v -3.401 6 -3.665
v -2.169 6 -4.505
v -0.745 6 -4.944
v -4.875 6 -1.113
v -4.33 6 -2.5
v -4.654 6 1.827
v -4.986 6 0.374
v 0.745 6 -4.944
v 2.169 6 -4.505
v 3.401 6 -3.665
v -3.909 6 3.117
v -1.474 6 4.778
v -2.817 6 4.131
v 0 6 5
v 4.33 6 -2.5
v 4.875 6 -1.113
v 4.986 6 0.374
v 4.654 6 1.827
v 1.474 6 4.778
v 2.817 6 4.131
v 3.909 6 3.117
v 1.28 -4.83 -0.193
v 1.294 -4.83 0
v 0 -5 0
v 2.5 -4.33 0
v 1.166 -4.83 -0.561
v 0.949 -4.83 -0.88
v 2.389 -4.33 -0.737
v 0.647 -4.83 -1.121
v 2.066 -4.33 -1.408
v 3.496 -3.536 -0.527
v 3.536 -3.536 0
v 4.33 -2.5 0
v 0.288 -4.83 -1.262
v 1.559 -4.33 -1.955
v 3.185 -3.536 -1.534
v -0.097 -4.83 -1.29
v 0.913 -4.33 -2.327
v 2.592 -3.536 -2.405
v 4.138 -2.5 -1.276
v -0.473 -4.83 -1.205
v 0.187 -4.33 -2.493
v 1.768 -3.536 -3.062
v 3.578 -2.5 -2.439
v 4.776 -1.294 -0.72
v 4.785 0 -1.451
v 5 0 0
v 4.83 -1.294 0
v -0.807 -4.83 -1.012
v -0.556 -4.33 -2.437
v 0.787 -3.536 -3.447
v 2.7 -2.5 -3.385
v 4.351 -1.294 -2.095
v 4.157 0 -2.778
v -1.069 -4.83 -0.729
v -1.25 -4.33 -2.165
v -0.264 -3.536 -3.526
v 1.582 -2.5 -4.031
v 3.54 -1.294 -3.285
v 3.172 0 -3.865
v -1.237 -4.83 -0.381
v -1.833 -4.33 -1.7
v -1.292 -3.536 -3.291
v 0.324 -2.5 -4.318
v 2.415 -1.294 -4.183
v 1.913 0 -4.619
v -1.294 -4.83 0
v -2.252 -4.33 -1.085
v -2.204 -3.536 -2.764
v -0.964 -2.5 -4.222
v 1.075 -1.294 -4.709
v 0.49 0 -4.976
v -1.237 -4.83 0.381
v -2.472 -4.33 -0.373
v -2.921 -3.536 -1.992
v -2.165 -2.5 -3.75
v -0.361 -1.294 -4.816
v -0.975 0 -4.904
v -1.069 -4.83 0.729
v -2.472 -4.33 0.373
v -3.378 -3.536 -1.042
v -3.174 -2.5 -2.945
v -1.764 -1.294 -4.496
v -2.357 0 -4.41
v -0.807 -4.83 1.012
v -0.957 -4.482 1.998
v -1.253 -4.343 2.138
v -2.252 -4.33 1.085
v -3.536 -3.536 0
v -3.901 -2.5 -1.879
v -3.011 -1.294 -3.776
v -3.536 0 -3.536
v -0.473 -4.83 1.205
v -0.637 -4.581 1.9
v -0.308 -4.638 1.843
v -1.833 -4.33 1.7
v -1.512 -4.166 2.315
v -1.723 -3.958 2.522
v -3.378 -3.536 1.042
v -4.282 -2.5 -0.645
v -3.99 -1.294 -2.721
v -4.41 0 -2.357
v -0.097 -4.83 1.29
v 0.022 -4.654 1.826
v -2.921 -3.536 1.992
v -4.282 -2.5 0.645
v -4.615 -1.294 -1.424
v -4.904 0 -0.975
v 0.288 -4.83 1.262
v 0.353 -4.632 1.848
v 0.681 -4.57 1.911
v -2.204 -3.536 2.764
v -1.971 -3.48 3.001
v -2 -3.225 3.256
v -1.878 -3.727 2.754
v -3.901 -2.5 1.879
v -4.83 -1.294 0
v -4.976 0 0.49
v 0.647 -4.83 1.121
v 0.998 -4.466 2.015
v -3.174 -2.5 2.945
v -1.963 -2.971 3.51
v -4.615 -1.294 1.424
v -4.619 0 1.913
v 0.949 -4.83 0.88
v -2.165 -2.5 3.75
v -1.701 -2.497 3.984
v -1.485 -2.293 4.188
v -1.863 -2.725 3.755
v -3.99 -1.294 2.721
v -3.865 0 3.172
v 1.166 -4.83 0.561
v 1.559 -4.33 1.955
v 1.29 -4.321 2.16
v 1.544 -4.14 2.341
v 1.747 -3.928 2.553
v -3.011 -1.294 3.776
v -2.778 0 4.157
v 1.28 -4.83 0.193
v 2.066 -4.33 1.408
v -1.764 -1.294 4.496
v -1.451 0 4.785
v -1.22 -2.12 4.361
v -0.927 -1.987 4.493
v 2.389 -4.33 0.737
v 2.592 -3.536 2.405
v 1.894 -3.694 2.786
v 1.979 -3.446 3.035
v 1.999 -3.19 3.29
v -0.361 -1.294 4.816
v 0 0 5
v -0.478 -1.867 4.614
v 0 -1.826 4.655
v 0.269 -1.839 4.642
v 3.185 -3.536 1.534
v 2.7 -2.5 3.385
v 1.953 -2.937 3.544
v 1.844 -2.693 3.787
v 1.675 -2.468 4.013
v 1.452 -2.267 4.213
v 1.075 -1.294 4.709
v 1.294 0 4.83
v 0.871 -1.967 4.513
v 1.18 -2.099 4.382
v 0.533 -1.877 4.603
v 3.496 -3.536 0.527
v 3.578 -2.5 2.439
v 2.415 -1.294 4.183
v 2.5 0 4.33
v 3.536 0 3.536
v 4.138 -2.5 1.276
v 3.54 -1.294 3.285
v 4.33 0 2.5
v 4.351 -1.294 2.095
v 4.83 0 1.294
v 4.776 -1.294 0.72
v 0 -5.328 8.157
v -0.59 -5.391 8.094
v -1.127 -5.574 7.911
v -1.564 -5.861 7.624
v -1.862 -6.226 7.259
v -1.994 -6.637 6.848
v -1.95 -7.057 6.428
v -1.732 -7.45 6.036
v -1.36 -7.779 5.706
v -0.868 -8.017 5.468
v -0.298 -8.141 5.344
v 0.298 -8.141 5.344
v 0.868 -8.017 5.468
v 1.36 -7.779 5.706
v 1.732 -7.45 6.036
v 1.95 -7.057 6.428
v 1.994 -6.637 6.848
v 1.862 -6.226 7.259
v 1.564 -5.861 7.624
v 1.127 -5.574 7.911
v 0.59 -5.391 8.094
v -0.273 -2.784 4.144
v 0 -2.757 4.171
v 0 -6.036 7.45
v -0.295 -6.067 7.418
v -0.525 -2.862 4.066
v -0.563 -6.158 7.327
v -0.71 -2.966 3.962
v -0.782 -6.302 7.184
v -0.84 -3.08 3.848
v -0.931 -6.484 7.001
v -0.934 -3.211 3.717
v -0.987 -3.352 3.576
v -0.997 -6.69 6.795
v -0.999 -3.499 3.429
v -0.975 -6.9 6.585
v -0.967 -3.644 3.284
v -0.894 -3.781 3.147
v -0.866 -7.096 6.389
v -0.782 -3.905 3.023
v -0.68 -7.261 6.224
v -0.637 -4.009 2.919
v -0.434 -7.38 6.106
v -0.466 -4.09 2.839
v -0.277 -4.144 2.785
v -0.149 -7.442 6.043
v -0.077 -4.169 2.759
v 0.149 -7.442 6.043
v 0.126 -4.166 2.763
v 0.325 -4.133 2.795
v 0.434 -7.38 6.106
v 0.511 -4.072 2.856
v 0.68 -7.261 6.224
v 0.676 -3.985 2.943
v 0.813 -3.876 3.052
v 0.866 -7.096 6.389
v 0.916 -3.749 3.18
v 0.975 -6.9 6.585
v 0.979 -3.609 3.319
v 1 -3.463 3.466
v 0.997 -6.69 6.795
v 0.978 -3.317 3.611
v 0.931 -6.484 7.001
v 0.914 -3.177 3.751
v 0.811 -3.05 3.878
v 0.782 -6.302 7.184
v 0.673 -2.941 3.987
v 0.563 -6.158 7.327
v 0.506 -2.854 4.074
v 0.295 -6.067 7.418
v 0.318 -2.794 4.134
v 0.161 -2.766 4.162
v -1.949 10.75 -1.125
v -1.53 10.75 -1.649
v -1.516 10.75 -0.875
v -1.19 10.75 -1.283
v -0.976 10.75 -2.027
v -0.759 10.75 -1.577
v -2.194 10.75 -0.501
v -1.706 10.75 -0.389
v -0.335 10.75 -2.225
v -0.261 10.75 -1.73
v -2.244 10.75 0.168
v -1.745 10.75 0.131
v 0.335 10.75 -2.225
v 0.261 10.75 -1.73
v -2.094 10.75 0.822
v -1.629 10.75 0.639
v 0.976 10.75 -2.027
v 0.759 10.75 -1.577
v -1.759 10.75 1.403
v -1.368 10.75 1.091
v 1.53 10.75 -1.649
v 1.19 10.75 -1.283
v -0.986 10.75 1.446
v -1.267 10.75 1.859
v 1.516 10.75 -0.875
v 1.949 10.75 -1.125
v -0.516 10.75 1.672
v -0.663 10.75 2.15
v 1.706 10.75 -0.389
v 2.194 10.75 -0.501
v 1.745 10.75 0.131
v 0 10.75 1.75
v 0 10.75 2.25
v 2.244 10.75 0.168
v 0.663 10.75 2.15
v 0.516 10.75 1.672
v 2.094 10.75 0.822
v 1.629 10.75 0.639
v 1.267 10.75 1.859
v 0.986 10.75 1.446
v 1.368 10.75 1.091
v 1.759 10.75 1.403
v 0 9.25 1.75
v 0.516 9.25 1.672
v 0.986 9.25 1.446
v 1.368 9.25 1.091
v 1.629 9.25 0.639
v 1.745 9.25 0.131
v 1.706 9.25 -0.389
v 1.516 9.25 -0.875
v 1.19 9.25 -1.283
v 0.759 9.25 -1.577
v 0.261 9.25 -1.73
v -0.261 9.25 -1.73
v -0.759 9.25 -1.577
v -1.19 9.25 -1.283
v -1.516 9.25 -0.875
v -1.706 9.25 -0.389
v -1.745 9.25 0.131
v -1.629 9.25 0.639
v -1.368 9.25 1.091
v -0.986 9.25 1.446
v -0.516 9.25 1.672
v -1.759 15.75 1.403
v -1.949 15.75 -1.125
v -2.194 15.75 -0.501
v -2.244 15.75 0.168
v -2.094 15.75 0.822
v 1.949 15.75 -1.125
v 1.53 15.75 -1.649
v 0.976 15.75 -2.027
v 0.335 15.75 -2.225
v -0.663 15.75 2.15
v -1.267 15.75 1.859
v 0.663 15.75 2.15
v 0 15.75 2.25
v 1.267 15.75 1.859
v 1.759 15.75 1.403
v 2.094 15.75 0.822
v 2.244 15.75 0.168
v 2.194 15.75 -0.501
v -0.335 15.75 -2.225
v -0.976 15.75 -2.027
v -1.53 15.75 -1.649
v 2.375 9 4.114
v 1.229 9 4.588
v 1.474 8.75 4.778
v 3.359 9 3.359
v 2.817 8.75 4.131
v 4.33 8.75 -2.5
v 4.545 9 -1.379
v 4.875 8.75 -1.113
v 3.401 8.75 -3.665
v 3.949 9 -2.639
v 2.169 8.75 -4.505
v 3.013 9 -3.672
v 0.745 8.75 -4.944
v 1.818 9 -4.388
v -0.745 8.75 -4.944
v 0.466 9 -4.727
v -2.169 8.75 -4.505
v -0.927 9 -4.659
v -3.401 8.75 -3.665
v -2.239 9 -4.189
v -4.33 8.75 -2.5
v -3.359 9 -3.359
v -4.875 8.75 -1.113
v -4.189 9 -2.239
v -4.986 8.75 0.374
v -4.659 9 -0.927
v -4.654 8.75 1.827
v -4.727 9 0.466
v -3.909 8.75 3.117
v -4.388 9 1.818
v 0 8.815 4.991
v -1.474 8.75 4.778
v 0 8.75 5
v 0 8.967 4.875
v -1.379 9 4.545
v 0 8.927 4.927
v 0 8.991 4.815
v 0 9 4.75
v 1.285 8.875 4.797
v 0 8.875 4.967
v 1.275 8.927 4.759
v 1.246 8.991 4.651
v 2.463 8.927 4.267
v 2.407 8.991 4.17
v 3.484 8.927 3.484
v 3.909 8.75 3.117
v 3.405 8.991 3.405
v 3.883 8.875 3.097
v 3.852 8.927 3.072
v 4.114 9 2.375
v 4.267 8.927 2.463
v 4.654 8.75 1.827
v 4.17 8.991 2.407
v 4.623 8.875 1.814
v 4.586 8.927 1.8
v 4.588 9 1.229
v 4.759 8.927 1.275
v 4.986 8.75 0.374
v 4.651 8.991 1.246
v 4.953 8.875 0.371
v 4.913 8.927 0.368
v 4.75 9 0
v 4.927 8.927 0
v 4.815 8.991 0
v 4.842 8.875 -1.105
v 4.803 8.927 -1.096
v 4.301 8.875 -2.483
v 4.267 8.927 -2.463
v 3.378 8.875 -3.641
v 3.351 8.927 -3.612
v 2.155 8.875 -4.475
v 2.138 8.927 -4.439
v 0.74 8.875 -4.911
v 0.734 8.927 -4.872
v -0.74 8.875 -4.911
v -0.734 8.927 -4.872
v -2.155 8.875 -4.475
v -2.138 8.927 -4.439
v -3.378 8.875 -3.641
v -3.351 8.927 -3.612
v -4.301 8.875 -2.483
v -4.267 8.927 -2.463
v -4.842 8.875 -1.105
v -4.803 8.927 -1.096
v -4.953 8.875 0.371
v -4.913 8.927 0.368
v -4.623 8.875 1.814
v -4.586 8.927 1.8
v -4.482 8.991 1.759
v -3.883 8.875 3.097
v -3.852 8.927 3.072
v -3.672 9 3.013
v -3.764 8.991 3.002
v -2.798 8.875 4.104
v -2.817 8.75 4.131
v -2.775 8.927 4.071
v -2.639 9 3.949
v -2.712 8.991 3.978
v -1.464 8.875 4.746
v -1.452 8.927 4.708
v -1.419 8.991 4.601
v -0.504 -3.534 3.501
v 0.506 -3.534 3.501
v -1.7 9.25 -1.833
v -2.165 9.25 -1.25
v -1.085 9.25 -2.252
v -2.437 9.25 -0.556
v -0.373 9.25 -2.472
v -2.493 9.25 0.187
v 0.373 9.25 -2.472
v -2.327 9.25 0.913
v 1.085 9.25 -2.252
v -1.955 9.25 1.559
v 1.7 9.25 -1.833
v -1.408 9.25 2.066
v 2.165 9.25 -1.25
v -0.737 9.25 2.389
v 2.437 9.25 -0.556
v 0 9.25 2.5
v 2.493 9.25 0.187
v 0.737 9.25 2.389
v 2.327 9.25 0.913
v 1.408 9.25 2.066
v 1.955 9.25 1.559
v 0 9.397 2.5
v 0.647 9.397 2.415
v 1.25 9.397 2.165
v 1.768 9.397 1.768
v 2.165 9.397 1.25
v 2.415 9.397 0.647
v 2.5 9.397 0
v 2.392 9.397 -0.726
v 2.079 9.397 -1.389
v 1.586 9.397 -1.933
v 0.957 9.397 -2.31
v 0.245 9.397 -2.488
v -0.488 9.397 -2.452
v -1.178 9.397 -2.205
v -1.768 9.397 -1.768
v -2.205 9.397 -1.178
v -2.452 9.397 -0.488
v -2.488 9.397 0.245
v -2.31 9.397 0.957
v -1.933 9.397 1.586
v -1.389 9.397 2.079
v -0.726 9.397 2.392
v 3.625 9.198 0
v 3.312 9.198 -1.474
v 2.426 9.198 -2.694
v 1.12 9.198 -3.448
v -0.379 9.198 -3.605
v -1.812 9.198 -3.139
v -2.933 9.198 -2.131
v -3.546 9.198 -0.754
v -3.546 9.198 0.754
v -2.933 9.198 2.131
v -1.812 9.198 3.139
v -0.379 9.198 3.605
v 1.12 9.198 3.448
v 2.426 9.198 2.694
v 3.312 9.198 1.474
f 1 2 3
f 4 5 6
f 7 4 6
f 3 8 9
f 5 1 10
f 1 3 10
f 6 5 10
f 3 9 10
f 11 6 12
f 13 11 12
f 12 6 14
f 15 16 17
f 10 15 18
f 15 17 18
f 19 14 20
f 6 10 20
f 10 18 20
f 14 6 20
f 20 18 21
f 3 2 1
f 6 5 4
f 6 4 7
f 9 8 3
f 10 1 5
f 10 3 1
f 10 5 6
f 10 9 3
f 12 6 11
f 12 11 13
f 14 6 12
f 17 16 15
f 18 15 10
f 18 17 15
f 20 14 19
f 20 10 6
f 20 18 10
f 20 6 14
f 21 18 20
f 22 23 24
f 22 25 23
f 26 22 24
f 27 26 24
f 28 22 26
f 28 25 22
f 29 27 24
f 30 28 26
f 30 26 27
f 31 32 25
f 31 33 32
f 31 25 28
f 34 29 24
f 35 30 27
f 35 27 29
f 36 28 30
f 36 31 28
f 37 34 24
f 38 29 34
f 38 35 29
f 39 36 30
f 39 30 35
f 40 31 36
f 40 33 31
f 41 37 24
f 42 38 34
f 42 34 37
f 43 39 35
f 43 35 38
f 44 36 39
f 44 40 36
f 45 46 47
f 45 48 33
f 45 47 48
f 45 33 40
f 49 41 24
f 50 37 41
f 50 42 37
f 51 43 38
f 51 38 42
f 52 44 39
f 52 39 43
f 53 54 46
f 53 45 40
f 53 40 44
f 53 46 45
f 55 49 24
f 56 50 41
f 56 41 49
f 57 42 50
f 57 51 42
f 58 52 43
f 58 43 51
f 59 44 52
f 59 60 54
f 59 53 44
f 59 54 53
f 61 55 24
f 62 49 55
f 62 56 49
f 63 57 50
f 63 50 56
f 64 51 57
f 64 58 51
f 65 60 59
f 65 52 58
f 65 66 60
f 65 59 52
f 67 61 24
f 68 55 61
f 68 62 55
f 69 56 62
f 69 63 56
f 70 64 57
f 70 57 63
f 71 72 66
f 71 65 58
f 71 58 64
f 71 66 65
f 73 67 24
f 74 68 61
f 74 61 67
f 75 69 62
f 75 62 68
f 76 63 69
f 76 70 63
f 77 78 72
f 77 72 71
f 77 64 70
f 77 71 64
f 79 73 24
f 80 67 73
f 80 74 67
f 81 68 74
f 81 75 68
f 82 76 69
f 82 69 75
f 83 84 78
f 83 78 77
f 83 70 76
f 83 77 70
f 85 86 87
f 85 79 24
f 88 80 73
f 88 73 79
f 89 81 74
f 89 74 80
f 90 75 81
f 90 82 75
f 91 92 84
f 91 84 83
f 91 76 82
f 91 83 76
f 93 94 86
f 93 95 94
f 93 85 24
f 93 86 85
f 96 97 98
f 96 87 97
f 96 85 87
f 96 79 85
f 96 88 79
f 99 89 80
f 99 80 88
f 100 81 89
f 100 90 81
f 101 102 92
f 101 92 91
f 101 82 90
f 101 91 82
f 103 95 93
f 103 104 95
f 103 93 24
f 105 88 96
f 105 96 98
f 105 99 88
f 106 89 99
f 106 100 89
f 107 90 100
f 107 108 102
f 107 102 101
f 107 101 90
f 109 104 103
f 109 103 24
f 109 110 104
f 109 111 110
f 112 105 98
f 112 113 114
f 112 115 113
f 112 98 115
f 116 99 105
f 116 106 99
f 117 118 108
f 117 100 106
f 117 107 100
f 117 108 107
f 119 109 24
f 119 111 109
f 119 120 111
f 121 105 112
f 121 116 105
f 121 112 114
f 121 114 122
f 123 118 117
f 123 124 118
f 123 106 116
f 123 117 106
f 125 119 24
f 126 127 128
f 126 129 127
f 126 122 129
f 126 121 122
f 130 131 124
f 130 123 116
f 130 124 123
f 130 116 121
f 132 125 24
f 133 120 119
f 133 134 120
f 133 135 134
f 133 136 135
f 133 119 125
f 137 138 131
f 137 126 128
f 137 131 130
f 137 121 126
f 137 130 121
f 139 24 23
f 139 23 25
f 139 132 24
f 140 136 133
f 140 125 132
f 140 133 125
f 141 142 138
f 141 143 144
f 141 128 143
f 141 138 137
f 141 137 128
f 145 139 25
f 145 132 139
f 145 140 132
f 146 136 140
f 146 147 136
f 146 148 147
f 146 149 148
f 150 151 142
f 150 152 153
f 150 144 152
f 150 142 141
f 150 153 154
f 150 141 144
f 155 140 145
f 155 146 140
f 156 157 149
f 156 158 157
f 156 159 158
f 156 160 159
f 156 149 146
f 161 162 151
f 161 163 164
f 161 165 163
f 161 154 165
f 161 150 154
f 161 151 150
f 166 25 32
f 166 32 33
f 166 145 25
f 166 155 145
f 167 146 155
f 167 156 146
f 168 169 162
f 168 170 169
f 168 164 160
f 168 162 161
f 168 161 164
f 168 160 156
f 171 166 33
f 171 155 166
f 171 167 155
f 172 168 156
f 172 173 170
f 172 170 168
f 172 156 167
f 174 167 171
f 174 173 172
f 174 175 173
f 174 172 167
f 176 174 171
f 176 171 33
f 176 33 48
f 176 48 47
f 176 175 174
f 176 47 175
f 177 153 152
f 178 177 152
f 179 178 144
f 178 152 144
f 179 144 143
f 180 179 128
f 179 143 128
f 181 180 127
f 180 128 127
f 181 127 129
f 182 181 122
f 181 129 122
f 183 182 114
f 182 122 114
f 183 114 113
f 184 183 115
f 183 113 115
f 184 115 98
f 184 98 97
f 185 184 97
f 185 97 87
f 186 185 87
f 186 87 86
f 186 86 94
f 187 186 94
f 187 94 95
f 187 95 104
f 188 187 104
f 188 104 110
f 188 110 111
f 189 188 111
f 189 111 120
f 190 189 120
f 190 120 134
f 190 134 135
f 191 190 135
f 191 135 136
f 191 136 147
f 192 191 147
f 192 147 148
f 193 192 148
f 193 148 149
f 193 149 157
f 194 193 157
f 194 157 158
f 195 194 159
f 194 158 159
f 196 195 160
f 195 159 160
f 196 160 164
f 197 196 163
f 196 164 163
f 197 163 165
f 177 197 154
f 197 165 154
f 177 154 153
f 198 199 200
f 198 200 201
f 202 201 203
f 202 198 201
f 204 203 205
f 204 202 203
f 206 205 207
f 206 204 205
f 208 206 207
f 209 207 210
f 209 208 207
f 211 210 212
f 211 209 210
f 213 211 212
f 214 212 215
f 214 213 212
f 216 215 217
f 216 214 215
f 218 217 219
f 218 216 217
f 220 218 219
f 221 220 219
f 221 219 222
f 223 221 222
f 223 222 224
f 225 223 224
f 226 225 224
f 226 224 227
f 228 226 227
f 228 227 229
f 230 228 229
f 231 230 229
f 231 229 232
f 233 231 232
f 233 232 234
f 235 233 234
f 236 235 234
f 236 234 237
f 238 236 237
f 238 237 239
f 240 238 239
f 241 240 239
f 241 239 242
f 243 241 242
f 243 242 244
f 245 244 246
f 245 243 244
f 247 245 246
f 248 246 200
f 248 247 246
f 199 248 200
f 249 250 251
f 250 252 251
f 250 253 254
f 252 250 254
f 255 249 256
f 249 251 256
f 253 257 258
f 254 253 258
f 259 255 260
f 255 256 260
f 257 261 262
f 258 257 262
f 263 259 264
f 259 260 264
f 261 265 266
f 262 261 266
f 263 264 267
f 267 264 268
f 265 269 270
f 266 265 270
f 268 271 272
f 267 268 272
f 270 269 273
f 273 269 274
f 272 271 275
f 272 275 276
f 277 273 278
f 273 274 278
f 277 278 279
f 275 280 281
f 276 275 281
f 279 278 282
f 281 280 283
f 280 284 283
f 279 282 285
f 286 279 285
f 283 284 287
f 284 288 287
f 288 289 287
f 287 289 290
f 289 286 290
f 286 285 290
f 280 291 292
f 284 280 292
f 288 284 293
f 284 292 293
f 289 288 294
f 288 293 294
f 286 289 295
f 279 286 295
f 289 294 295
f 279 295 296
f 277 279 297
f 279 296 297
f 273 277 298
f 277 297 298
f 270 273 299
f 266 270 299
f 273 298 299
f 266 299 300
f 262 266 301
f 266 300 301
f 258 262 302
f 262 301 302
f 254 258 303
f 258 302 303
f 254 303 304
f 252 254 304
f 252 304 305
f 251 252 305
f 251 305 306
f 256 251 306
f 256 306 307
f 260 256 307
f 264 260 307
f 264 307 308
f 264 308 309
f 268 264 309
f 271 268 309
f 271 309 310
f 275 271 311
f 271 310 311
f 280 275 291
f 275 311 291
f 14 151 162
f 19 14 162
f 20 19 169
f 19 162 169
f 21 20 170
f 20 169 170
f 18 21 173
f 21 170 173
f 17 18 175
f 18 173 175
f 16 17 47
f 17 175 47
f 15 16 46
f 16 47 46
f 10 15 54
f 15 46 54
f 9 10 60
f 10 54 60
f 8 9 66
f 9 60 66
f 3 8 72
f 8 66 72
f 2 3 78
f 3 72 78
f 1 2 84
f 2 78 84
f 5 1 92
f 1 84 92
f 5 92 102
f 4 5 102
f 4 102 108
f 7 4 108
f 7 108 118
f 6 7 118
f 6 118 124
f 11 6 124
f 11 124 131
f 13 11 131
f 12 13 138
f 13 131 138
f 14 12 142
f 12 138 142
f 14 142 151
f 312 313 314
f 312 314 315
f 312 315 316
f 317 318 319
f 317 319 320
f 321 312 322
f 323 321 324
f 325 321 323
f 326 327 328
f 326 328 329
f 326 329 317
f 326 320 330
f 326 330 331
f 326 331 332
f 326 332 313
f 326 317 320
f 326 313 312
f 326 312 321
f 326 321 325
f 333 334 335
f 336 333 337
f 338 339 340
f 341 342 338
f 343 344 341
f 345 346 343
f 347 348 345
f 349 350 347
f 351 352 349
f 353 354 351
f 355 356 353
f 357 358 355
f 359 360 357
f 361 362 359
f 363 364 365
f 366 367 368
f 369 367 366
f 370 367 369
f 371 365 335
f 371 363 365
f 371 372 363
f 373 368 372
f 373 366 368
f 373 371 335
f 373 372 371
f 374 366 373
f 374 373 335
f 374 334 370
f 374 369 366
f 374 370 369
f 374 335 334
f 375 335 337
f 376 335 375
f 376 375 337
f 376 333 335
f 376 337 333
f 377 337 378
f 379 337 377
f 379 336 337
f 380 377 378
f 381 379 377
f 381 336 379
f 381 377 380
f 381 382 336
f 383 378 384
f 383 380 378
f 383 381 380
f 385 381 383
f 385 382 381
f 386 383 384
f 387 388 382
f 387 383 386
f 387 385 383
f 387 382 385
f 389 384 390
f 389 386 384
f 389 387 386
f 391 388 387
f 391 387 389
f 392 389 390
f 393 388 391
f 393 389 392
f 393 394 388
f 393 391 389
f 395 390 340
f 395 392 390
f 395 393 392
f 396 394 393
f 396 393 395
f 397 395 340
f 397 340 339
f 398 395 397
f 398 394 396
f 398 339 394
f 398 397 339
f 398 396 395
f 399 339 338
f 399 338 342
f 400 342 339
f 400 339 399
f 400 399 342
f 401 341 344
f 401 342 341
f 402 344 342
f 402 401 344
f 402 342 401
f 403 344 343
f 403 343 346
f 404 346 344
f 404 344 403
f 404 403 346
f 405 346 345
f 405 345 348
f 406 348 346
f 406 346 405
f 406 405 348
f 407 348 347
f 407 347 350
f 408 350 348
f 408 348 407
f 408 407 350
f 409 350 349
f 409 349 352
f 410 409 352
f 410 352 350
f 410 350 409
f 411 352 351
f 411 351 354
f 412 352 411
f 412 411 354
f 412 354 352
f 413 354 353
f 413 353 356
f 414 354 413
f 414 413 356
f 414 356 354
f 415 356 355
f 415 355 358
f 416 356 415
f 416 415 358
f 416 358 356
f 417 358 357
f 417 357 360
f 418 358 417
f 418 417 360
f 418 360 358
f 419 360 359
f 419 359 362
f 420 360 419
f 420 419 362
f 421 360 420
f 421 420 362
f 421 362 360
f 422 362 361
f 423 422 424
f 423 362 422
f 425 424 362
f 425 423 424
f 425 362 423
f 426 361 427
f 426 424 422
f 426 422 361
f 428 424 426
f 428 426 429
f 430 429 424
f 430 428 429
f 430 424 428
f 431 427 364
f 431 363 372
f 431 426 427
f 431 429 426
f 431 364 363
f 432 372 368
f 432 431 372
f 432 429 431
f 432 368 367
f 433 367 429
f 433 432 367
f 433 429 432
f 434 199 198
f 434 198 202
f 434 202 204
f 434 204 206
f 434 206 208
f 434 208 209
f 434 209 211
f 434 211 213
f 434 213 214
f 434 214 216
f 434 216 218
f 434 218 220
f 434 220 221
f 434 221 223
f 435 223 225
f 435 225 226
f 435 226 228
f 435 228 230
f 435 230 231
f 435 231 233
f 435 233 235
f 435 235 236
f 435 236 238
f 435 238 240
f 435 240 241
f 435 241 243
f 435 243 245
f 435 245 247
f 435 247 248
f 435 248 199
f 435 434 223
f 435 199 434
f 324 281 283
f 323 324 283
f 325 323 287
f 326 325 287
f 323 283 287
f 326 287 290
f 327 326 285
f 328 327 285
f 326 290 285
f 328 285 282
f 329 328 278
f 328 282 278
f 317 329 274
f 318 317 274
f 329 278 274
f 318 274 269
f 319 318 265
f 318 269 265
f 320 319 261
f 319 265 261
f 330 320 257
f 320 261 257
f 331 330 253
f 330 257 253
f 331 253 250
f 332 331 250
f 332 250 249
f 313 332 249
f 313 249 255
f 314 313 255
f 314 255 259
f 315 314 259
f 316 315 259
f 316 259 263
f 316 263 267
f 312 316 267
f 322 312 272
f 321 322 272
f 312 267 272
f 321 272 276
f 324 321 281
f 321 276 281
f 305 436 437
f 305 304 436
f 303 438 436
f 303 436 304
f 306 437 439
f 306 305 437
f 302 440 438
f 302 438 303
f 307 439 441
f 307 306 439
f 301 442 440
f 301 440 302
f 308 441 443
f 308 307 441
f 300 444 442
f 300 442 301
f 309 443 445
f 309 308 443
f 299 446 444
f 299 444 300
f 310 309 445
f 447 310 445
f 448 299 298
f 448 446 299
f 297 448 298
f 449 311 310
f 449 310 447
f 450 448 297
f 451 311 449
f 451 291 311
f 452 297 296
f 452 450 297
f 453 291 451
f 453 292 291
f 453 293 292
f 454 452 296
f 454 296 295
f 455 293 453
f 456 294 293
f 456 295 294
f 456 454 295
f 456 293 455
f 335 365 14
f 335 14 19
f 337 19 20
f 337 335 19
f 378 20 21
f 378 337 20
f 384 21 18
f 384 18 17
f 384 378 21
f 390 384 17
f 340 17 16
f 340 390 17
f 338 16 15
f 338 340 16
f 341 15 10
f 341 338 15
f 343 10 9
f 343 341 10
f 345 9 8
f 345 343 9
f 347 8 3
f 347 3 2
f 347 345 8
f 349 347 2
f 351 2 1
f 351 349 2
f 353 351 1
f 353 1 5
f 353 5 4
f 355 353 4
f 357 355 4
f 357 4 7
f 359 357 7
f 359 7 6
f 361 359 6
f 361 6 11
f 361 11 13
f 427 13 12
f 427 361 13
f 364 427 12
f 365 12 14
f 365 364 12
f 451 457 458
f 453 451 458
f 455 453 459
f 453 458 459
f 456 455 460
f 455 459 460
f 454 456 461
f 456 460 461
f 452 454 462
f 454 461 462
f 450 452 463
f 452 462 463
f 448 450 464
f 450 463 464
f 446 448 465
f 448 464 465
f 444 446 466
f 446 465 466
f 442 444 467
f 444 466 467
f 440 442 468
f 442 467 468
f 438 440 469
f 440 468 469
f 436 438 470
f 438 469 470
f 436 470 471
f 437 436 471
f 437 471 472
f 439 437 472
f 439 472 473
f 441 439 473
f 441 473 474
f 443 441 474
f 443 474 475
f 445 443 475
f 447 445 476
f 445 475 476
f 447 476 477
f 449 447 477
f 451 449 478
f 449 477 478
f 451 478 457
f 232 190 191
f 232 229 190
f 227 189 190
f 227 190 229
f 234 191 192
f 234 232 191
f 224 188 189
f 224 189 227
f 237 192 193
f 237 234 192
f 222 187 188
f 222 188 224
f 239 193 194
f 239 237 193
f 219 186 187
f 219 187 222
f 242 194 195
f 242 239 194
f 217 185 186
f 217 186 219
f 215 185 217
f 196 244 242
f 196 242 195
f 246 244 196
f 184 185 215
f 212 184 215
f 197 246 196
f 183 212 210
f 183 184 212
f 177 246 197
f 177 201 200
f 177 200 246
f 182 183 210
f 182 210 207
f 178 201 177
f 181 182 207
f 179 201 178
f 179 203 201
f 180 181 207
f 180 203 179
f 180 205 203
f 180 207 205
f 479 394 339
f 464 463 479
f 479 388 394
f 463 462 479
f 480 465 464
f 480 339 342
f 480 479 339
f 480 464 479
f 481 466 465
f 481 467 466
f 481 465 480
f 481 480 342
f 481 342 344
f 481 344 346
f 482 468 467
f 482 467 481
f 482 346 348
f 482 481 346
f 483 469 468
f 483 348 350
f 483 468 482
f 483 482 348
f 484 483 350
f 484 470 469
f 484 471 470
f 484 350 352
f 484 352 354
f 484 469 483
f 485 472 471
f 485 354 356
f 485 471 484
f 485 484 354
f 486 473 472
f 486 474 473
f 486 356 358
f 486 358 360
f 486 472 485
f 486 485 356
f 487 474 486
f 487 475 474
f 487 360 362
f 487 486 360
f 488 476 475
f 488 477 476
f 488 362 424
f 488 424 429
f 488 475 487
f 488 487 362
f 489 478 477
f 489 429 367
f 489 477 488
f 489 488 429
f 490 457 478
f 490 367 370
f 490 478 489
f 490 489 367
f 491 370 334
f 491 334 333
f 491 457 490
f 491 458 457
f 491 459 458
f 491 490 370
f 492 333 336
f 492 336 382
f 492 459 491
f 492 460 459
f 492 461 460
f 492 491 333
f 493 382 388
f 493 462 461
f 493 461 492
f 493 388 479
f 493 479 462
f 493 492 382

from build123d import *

# Parameters (mm, degrees)
SKETCH1_R           = 5
BOSS_EXTRUDE1_DEPTH = 6
SKETCH2_R           = 5
BOSS_EXTRUDE2_DEPTH = 3
FILLET1_R           = 0.25
SKETCH3_R           = 4.75
BOSS_EXTRUDE3_DEPTH = 0.5
BOSS_EXTRUDE3_TAPER = 80
SKETCH4_R           = 2.5
CUT_EXTRUDE1_DEPTH  = 0.25
SKETCH5_R           = 1.75
BOSS_EXTRUDE4_DEPTH = 1.5
SKETCH6_R           = 2.25
BOSS_EXTRUDE5_DEPTH = 5
SKETCH8_R           = 2
SKETCH8_R_2         = 1
BOSS_EXTRUDE6_DEPTH = 6


# Read off the part's stored shape, not the designer's step: Dome1
with BuildPart() as part:
    # Sketch1 → Boss-Extrude1 (new body)
    with BuildSketch(Plane(origin=(0, 0, 0), x_dir=(1, 0, 0), z_dir=(0, 1, 0))):
        with Locations(Location((0, 0, 0), (0, 0, 270))):
            Circle(SKETCH1_R)
    extrude(amount=BOSS_EXTRUDE1_DEPTH)

    # Dome1 outline → Dome1 (revolve)
    with BuildSketch(Plane.XY):
        with BuildLine():
            Line((0, 5e-09), (0, -5))
            ThreePointArc((0, -5), (3.535533908, -3.535533904), (5, 5e-09))
            Line((5, 5e-09), (0, 5e-09))
        make_face()
    revolve(axis=Axis((0, 0, 0), (0, 1, 0)))

    # Sketch8 → Boss-Extrude6 (add)
    with BuildSketch(Plane(origin=(0, -2.5, 2.5), x_dir=(1, 0, 0), z_dir=(0, -0.7071067811865475, 0.7071067811865477))):
        with Locations(Location((0, 0, 0), (0, 0, 90))):
            Circle(SKETCH8_R)
        with Locations(Location((0, 0, 0), (0, 0, 90))):
            Circle(SKETCH8_R_2, mode=Mode.SUBTRACT)
    extrude(amount=BOSS_EXTRUDE6_DEPTH)


with BuildPart() as body_2:
    # Sketch2 → Boss-Extrude2 (new body)
    with BuildSketch(Plane(origin=(0, 9, 0), x_dir=(1, 0, 0), z_dir=(0, 1, 0))):
        with Locations(Location((0, 0, 0), (0, 0, 270))):
            Circle(SKETCH2_R)
    extrude(amount=-BOSS_EXTRUDE2_DEPTH)

    # Fillet1
    fillet1_edges = [body_2.edges().sort_by_distance(p)[0] for p in [
        (0, 9, -5),
    ]]
    fillet(fillet1_edges, radius=FILLET1_R)

    # Sketch3 → Boss-Extrude3 (add)
    with BuildSketch(Plane(origin=(0, 9, 0), x_dir=(1, 0, 0), z_dir=(0, 1, 0))):
        Circle(SKETCH3_R)
    extrude(amount=BOSS_EXTRUDE3_DEPTH, taper=BOSS_EXTRUDE3_TAPER)

    # Sketch4 → Cut-Extrude1 (cut)
    with BuildSketch(Plane(origin=(0, 9.5, 0), x_dir=(1, 0, 0), z_dir=(0, 1, 0))):
        with Locations(Location((0, 0, 0), (0, 0, 270))):
            Circle(SKETCH4_R)
    extrude(amount=-CUT_EXTRUDE1_DEPTH, mode=Mode.SUBTRACT)

    # Sketch5 → Boss-Extrude4 (add)
    with BuildSketch(Plane(origin=(0, 9.25, 0), x_dir=(1, 0, 0), z_dir=(0, 1, 0))):
        with Locations(Location((0, 0, 0), (0, 0, 270))):
            Circle(SKETCH5_R)
    extrude(amount=BOSS_EXTRUDE4_DEPTH)

    # Sketch6 → Boss-Extrude5 (add)
    with BuildSketch(Plane(origin=(0, 10.75, 0), x_dir=(1, 0, 0), z_dir=(0, 1, 0))):
        with Locations(Location((0, 0, 0), (0, 0, 270))):
            Circle(SKETCH6_R)
    extrude(amount=BOSS_EXTRUDE5_DEPTH)


solid = Compound([part.part, body_2.part])
